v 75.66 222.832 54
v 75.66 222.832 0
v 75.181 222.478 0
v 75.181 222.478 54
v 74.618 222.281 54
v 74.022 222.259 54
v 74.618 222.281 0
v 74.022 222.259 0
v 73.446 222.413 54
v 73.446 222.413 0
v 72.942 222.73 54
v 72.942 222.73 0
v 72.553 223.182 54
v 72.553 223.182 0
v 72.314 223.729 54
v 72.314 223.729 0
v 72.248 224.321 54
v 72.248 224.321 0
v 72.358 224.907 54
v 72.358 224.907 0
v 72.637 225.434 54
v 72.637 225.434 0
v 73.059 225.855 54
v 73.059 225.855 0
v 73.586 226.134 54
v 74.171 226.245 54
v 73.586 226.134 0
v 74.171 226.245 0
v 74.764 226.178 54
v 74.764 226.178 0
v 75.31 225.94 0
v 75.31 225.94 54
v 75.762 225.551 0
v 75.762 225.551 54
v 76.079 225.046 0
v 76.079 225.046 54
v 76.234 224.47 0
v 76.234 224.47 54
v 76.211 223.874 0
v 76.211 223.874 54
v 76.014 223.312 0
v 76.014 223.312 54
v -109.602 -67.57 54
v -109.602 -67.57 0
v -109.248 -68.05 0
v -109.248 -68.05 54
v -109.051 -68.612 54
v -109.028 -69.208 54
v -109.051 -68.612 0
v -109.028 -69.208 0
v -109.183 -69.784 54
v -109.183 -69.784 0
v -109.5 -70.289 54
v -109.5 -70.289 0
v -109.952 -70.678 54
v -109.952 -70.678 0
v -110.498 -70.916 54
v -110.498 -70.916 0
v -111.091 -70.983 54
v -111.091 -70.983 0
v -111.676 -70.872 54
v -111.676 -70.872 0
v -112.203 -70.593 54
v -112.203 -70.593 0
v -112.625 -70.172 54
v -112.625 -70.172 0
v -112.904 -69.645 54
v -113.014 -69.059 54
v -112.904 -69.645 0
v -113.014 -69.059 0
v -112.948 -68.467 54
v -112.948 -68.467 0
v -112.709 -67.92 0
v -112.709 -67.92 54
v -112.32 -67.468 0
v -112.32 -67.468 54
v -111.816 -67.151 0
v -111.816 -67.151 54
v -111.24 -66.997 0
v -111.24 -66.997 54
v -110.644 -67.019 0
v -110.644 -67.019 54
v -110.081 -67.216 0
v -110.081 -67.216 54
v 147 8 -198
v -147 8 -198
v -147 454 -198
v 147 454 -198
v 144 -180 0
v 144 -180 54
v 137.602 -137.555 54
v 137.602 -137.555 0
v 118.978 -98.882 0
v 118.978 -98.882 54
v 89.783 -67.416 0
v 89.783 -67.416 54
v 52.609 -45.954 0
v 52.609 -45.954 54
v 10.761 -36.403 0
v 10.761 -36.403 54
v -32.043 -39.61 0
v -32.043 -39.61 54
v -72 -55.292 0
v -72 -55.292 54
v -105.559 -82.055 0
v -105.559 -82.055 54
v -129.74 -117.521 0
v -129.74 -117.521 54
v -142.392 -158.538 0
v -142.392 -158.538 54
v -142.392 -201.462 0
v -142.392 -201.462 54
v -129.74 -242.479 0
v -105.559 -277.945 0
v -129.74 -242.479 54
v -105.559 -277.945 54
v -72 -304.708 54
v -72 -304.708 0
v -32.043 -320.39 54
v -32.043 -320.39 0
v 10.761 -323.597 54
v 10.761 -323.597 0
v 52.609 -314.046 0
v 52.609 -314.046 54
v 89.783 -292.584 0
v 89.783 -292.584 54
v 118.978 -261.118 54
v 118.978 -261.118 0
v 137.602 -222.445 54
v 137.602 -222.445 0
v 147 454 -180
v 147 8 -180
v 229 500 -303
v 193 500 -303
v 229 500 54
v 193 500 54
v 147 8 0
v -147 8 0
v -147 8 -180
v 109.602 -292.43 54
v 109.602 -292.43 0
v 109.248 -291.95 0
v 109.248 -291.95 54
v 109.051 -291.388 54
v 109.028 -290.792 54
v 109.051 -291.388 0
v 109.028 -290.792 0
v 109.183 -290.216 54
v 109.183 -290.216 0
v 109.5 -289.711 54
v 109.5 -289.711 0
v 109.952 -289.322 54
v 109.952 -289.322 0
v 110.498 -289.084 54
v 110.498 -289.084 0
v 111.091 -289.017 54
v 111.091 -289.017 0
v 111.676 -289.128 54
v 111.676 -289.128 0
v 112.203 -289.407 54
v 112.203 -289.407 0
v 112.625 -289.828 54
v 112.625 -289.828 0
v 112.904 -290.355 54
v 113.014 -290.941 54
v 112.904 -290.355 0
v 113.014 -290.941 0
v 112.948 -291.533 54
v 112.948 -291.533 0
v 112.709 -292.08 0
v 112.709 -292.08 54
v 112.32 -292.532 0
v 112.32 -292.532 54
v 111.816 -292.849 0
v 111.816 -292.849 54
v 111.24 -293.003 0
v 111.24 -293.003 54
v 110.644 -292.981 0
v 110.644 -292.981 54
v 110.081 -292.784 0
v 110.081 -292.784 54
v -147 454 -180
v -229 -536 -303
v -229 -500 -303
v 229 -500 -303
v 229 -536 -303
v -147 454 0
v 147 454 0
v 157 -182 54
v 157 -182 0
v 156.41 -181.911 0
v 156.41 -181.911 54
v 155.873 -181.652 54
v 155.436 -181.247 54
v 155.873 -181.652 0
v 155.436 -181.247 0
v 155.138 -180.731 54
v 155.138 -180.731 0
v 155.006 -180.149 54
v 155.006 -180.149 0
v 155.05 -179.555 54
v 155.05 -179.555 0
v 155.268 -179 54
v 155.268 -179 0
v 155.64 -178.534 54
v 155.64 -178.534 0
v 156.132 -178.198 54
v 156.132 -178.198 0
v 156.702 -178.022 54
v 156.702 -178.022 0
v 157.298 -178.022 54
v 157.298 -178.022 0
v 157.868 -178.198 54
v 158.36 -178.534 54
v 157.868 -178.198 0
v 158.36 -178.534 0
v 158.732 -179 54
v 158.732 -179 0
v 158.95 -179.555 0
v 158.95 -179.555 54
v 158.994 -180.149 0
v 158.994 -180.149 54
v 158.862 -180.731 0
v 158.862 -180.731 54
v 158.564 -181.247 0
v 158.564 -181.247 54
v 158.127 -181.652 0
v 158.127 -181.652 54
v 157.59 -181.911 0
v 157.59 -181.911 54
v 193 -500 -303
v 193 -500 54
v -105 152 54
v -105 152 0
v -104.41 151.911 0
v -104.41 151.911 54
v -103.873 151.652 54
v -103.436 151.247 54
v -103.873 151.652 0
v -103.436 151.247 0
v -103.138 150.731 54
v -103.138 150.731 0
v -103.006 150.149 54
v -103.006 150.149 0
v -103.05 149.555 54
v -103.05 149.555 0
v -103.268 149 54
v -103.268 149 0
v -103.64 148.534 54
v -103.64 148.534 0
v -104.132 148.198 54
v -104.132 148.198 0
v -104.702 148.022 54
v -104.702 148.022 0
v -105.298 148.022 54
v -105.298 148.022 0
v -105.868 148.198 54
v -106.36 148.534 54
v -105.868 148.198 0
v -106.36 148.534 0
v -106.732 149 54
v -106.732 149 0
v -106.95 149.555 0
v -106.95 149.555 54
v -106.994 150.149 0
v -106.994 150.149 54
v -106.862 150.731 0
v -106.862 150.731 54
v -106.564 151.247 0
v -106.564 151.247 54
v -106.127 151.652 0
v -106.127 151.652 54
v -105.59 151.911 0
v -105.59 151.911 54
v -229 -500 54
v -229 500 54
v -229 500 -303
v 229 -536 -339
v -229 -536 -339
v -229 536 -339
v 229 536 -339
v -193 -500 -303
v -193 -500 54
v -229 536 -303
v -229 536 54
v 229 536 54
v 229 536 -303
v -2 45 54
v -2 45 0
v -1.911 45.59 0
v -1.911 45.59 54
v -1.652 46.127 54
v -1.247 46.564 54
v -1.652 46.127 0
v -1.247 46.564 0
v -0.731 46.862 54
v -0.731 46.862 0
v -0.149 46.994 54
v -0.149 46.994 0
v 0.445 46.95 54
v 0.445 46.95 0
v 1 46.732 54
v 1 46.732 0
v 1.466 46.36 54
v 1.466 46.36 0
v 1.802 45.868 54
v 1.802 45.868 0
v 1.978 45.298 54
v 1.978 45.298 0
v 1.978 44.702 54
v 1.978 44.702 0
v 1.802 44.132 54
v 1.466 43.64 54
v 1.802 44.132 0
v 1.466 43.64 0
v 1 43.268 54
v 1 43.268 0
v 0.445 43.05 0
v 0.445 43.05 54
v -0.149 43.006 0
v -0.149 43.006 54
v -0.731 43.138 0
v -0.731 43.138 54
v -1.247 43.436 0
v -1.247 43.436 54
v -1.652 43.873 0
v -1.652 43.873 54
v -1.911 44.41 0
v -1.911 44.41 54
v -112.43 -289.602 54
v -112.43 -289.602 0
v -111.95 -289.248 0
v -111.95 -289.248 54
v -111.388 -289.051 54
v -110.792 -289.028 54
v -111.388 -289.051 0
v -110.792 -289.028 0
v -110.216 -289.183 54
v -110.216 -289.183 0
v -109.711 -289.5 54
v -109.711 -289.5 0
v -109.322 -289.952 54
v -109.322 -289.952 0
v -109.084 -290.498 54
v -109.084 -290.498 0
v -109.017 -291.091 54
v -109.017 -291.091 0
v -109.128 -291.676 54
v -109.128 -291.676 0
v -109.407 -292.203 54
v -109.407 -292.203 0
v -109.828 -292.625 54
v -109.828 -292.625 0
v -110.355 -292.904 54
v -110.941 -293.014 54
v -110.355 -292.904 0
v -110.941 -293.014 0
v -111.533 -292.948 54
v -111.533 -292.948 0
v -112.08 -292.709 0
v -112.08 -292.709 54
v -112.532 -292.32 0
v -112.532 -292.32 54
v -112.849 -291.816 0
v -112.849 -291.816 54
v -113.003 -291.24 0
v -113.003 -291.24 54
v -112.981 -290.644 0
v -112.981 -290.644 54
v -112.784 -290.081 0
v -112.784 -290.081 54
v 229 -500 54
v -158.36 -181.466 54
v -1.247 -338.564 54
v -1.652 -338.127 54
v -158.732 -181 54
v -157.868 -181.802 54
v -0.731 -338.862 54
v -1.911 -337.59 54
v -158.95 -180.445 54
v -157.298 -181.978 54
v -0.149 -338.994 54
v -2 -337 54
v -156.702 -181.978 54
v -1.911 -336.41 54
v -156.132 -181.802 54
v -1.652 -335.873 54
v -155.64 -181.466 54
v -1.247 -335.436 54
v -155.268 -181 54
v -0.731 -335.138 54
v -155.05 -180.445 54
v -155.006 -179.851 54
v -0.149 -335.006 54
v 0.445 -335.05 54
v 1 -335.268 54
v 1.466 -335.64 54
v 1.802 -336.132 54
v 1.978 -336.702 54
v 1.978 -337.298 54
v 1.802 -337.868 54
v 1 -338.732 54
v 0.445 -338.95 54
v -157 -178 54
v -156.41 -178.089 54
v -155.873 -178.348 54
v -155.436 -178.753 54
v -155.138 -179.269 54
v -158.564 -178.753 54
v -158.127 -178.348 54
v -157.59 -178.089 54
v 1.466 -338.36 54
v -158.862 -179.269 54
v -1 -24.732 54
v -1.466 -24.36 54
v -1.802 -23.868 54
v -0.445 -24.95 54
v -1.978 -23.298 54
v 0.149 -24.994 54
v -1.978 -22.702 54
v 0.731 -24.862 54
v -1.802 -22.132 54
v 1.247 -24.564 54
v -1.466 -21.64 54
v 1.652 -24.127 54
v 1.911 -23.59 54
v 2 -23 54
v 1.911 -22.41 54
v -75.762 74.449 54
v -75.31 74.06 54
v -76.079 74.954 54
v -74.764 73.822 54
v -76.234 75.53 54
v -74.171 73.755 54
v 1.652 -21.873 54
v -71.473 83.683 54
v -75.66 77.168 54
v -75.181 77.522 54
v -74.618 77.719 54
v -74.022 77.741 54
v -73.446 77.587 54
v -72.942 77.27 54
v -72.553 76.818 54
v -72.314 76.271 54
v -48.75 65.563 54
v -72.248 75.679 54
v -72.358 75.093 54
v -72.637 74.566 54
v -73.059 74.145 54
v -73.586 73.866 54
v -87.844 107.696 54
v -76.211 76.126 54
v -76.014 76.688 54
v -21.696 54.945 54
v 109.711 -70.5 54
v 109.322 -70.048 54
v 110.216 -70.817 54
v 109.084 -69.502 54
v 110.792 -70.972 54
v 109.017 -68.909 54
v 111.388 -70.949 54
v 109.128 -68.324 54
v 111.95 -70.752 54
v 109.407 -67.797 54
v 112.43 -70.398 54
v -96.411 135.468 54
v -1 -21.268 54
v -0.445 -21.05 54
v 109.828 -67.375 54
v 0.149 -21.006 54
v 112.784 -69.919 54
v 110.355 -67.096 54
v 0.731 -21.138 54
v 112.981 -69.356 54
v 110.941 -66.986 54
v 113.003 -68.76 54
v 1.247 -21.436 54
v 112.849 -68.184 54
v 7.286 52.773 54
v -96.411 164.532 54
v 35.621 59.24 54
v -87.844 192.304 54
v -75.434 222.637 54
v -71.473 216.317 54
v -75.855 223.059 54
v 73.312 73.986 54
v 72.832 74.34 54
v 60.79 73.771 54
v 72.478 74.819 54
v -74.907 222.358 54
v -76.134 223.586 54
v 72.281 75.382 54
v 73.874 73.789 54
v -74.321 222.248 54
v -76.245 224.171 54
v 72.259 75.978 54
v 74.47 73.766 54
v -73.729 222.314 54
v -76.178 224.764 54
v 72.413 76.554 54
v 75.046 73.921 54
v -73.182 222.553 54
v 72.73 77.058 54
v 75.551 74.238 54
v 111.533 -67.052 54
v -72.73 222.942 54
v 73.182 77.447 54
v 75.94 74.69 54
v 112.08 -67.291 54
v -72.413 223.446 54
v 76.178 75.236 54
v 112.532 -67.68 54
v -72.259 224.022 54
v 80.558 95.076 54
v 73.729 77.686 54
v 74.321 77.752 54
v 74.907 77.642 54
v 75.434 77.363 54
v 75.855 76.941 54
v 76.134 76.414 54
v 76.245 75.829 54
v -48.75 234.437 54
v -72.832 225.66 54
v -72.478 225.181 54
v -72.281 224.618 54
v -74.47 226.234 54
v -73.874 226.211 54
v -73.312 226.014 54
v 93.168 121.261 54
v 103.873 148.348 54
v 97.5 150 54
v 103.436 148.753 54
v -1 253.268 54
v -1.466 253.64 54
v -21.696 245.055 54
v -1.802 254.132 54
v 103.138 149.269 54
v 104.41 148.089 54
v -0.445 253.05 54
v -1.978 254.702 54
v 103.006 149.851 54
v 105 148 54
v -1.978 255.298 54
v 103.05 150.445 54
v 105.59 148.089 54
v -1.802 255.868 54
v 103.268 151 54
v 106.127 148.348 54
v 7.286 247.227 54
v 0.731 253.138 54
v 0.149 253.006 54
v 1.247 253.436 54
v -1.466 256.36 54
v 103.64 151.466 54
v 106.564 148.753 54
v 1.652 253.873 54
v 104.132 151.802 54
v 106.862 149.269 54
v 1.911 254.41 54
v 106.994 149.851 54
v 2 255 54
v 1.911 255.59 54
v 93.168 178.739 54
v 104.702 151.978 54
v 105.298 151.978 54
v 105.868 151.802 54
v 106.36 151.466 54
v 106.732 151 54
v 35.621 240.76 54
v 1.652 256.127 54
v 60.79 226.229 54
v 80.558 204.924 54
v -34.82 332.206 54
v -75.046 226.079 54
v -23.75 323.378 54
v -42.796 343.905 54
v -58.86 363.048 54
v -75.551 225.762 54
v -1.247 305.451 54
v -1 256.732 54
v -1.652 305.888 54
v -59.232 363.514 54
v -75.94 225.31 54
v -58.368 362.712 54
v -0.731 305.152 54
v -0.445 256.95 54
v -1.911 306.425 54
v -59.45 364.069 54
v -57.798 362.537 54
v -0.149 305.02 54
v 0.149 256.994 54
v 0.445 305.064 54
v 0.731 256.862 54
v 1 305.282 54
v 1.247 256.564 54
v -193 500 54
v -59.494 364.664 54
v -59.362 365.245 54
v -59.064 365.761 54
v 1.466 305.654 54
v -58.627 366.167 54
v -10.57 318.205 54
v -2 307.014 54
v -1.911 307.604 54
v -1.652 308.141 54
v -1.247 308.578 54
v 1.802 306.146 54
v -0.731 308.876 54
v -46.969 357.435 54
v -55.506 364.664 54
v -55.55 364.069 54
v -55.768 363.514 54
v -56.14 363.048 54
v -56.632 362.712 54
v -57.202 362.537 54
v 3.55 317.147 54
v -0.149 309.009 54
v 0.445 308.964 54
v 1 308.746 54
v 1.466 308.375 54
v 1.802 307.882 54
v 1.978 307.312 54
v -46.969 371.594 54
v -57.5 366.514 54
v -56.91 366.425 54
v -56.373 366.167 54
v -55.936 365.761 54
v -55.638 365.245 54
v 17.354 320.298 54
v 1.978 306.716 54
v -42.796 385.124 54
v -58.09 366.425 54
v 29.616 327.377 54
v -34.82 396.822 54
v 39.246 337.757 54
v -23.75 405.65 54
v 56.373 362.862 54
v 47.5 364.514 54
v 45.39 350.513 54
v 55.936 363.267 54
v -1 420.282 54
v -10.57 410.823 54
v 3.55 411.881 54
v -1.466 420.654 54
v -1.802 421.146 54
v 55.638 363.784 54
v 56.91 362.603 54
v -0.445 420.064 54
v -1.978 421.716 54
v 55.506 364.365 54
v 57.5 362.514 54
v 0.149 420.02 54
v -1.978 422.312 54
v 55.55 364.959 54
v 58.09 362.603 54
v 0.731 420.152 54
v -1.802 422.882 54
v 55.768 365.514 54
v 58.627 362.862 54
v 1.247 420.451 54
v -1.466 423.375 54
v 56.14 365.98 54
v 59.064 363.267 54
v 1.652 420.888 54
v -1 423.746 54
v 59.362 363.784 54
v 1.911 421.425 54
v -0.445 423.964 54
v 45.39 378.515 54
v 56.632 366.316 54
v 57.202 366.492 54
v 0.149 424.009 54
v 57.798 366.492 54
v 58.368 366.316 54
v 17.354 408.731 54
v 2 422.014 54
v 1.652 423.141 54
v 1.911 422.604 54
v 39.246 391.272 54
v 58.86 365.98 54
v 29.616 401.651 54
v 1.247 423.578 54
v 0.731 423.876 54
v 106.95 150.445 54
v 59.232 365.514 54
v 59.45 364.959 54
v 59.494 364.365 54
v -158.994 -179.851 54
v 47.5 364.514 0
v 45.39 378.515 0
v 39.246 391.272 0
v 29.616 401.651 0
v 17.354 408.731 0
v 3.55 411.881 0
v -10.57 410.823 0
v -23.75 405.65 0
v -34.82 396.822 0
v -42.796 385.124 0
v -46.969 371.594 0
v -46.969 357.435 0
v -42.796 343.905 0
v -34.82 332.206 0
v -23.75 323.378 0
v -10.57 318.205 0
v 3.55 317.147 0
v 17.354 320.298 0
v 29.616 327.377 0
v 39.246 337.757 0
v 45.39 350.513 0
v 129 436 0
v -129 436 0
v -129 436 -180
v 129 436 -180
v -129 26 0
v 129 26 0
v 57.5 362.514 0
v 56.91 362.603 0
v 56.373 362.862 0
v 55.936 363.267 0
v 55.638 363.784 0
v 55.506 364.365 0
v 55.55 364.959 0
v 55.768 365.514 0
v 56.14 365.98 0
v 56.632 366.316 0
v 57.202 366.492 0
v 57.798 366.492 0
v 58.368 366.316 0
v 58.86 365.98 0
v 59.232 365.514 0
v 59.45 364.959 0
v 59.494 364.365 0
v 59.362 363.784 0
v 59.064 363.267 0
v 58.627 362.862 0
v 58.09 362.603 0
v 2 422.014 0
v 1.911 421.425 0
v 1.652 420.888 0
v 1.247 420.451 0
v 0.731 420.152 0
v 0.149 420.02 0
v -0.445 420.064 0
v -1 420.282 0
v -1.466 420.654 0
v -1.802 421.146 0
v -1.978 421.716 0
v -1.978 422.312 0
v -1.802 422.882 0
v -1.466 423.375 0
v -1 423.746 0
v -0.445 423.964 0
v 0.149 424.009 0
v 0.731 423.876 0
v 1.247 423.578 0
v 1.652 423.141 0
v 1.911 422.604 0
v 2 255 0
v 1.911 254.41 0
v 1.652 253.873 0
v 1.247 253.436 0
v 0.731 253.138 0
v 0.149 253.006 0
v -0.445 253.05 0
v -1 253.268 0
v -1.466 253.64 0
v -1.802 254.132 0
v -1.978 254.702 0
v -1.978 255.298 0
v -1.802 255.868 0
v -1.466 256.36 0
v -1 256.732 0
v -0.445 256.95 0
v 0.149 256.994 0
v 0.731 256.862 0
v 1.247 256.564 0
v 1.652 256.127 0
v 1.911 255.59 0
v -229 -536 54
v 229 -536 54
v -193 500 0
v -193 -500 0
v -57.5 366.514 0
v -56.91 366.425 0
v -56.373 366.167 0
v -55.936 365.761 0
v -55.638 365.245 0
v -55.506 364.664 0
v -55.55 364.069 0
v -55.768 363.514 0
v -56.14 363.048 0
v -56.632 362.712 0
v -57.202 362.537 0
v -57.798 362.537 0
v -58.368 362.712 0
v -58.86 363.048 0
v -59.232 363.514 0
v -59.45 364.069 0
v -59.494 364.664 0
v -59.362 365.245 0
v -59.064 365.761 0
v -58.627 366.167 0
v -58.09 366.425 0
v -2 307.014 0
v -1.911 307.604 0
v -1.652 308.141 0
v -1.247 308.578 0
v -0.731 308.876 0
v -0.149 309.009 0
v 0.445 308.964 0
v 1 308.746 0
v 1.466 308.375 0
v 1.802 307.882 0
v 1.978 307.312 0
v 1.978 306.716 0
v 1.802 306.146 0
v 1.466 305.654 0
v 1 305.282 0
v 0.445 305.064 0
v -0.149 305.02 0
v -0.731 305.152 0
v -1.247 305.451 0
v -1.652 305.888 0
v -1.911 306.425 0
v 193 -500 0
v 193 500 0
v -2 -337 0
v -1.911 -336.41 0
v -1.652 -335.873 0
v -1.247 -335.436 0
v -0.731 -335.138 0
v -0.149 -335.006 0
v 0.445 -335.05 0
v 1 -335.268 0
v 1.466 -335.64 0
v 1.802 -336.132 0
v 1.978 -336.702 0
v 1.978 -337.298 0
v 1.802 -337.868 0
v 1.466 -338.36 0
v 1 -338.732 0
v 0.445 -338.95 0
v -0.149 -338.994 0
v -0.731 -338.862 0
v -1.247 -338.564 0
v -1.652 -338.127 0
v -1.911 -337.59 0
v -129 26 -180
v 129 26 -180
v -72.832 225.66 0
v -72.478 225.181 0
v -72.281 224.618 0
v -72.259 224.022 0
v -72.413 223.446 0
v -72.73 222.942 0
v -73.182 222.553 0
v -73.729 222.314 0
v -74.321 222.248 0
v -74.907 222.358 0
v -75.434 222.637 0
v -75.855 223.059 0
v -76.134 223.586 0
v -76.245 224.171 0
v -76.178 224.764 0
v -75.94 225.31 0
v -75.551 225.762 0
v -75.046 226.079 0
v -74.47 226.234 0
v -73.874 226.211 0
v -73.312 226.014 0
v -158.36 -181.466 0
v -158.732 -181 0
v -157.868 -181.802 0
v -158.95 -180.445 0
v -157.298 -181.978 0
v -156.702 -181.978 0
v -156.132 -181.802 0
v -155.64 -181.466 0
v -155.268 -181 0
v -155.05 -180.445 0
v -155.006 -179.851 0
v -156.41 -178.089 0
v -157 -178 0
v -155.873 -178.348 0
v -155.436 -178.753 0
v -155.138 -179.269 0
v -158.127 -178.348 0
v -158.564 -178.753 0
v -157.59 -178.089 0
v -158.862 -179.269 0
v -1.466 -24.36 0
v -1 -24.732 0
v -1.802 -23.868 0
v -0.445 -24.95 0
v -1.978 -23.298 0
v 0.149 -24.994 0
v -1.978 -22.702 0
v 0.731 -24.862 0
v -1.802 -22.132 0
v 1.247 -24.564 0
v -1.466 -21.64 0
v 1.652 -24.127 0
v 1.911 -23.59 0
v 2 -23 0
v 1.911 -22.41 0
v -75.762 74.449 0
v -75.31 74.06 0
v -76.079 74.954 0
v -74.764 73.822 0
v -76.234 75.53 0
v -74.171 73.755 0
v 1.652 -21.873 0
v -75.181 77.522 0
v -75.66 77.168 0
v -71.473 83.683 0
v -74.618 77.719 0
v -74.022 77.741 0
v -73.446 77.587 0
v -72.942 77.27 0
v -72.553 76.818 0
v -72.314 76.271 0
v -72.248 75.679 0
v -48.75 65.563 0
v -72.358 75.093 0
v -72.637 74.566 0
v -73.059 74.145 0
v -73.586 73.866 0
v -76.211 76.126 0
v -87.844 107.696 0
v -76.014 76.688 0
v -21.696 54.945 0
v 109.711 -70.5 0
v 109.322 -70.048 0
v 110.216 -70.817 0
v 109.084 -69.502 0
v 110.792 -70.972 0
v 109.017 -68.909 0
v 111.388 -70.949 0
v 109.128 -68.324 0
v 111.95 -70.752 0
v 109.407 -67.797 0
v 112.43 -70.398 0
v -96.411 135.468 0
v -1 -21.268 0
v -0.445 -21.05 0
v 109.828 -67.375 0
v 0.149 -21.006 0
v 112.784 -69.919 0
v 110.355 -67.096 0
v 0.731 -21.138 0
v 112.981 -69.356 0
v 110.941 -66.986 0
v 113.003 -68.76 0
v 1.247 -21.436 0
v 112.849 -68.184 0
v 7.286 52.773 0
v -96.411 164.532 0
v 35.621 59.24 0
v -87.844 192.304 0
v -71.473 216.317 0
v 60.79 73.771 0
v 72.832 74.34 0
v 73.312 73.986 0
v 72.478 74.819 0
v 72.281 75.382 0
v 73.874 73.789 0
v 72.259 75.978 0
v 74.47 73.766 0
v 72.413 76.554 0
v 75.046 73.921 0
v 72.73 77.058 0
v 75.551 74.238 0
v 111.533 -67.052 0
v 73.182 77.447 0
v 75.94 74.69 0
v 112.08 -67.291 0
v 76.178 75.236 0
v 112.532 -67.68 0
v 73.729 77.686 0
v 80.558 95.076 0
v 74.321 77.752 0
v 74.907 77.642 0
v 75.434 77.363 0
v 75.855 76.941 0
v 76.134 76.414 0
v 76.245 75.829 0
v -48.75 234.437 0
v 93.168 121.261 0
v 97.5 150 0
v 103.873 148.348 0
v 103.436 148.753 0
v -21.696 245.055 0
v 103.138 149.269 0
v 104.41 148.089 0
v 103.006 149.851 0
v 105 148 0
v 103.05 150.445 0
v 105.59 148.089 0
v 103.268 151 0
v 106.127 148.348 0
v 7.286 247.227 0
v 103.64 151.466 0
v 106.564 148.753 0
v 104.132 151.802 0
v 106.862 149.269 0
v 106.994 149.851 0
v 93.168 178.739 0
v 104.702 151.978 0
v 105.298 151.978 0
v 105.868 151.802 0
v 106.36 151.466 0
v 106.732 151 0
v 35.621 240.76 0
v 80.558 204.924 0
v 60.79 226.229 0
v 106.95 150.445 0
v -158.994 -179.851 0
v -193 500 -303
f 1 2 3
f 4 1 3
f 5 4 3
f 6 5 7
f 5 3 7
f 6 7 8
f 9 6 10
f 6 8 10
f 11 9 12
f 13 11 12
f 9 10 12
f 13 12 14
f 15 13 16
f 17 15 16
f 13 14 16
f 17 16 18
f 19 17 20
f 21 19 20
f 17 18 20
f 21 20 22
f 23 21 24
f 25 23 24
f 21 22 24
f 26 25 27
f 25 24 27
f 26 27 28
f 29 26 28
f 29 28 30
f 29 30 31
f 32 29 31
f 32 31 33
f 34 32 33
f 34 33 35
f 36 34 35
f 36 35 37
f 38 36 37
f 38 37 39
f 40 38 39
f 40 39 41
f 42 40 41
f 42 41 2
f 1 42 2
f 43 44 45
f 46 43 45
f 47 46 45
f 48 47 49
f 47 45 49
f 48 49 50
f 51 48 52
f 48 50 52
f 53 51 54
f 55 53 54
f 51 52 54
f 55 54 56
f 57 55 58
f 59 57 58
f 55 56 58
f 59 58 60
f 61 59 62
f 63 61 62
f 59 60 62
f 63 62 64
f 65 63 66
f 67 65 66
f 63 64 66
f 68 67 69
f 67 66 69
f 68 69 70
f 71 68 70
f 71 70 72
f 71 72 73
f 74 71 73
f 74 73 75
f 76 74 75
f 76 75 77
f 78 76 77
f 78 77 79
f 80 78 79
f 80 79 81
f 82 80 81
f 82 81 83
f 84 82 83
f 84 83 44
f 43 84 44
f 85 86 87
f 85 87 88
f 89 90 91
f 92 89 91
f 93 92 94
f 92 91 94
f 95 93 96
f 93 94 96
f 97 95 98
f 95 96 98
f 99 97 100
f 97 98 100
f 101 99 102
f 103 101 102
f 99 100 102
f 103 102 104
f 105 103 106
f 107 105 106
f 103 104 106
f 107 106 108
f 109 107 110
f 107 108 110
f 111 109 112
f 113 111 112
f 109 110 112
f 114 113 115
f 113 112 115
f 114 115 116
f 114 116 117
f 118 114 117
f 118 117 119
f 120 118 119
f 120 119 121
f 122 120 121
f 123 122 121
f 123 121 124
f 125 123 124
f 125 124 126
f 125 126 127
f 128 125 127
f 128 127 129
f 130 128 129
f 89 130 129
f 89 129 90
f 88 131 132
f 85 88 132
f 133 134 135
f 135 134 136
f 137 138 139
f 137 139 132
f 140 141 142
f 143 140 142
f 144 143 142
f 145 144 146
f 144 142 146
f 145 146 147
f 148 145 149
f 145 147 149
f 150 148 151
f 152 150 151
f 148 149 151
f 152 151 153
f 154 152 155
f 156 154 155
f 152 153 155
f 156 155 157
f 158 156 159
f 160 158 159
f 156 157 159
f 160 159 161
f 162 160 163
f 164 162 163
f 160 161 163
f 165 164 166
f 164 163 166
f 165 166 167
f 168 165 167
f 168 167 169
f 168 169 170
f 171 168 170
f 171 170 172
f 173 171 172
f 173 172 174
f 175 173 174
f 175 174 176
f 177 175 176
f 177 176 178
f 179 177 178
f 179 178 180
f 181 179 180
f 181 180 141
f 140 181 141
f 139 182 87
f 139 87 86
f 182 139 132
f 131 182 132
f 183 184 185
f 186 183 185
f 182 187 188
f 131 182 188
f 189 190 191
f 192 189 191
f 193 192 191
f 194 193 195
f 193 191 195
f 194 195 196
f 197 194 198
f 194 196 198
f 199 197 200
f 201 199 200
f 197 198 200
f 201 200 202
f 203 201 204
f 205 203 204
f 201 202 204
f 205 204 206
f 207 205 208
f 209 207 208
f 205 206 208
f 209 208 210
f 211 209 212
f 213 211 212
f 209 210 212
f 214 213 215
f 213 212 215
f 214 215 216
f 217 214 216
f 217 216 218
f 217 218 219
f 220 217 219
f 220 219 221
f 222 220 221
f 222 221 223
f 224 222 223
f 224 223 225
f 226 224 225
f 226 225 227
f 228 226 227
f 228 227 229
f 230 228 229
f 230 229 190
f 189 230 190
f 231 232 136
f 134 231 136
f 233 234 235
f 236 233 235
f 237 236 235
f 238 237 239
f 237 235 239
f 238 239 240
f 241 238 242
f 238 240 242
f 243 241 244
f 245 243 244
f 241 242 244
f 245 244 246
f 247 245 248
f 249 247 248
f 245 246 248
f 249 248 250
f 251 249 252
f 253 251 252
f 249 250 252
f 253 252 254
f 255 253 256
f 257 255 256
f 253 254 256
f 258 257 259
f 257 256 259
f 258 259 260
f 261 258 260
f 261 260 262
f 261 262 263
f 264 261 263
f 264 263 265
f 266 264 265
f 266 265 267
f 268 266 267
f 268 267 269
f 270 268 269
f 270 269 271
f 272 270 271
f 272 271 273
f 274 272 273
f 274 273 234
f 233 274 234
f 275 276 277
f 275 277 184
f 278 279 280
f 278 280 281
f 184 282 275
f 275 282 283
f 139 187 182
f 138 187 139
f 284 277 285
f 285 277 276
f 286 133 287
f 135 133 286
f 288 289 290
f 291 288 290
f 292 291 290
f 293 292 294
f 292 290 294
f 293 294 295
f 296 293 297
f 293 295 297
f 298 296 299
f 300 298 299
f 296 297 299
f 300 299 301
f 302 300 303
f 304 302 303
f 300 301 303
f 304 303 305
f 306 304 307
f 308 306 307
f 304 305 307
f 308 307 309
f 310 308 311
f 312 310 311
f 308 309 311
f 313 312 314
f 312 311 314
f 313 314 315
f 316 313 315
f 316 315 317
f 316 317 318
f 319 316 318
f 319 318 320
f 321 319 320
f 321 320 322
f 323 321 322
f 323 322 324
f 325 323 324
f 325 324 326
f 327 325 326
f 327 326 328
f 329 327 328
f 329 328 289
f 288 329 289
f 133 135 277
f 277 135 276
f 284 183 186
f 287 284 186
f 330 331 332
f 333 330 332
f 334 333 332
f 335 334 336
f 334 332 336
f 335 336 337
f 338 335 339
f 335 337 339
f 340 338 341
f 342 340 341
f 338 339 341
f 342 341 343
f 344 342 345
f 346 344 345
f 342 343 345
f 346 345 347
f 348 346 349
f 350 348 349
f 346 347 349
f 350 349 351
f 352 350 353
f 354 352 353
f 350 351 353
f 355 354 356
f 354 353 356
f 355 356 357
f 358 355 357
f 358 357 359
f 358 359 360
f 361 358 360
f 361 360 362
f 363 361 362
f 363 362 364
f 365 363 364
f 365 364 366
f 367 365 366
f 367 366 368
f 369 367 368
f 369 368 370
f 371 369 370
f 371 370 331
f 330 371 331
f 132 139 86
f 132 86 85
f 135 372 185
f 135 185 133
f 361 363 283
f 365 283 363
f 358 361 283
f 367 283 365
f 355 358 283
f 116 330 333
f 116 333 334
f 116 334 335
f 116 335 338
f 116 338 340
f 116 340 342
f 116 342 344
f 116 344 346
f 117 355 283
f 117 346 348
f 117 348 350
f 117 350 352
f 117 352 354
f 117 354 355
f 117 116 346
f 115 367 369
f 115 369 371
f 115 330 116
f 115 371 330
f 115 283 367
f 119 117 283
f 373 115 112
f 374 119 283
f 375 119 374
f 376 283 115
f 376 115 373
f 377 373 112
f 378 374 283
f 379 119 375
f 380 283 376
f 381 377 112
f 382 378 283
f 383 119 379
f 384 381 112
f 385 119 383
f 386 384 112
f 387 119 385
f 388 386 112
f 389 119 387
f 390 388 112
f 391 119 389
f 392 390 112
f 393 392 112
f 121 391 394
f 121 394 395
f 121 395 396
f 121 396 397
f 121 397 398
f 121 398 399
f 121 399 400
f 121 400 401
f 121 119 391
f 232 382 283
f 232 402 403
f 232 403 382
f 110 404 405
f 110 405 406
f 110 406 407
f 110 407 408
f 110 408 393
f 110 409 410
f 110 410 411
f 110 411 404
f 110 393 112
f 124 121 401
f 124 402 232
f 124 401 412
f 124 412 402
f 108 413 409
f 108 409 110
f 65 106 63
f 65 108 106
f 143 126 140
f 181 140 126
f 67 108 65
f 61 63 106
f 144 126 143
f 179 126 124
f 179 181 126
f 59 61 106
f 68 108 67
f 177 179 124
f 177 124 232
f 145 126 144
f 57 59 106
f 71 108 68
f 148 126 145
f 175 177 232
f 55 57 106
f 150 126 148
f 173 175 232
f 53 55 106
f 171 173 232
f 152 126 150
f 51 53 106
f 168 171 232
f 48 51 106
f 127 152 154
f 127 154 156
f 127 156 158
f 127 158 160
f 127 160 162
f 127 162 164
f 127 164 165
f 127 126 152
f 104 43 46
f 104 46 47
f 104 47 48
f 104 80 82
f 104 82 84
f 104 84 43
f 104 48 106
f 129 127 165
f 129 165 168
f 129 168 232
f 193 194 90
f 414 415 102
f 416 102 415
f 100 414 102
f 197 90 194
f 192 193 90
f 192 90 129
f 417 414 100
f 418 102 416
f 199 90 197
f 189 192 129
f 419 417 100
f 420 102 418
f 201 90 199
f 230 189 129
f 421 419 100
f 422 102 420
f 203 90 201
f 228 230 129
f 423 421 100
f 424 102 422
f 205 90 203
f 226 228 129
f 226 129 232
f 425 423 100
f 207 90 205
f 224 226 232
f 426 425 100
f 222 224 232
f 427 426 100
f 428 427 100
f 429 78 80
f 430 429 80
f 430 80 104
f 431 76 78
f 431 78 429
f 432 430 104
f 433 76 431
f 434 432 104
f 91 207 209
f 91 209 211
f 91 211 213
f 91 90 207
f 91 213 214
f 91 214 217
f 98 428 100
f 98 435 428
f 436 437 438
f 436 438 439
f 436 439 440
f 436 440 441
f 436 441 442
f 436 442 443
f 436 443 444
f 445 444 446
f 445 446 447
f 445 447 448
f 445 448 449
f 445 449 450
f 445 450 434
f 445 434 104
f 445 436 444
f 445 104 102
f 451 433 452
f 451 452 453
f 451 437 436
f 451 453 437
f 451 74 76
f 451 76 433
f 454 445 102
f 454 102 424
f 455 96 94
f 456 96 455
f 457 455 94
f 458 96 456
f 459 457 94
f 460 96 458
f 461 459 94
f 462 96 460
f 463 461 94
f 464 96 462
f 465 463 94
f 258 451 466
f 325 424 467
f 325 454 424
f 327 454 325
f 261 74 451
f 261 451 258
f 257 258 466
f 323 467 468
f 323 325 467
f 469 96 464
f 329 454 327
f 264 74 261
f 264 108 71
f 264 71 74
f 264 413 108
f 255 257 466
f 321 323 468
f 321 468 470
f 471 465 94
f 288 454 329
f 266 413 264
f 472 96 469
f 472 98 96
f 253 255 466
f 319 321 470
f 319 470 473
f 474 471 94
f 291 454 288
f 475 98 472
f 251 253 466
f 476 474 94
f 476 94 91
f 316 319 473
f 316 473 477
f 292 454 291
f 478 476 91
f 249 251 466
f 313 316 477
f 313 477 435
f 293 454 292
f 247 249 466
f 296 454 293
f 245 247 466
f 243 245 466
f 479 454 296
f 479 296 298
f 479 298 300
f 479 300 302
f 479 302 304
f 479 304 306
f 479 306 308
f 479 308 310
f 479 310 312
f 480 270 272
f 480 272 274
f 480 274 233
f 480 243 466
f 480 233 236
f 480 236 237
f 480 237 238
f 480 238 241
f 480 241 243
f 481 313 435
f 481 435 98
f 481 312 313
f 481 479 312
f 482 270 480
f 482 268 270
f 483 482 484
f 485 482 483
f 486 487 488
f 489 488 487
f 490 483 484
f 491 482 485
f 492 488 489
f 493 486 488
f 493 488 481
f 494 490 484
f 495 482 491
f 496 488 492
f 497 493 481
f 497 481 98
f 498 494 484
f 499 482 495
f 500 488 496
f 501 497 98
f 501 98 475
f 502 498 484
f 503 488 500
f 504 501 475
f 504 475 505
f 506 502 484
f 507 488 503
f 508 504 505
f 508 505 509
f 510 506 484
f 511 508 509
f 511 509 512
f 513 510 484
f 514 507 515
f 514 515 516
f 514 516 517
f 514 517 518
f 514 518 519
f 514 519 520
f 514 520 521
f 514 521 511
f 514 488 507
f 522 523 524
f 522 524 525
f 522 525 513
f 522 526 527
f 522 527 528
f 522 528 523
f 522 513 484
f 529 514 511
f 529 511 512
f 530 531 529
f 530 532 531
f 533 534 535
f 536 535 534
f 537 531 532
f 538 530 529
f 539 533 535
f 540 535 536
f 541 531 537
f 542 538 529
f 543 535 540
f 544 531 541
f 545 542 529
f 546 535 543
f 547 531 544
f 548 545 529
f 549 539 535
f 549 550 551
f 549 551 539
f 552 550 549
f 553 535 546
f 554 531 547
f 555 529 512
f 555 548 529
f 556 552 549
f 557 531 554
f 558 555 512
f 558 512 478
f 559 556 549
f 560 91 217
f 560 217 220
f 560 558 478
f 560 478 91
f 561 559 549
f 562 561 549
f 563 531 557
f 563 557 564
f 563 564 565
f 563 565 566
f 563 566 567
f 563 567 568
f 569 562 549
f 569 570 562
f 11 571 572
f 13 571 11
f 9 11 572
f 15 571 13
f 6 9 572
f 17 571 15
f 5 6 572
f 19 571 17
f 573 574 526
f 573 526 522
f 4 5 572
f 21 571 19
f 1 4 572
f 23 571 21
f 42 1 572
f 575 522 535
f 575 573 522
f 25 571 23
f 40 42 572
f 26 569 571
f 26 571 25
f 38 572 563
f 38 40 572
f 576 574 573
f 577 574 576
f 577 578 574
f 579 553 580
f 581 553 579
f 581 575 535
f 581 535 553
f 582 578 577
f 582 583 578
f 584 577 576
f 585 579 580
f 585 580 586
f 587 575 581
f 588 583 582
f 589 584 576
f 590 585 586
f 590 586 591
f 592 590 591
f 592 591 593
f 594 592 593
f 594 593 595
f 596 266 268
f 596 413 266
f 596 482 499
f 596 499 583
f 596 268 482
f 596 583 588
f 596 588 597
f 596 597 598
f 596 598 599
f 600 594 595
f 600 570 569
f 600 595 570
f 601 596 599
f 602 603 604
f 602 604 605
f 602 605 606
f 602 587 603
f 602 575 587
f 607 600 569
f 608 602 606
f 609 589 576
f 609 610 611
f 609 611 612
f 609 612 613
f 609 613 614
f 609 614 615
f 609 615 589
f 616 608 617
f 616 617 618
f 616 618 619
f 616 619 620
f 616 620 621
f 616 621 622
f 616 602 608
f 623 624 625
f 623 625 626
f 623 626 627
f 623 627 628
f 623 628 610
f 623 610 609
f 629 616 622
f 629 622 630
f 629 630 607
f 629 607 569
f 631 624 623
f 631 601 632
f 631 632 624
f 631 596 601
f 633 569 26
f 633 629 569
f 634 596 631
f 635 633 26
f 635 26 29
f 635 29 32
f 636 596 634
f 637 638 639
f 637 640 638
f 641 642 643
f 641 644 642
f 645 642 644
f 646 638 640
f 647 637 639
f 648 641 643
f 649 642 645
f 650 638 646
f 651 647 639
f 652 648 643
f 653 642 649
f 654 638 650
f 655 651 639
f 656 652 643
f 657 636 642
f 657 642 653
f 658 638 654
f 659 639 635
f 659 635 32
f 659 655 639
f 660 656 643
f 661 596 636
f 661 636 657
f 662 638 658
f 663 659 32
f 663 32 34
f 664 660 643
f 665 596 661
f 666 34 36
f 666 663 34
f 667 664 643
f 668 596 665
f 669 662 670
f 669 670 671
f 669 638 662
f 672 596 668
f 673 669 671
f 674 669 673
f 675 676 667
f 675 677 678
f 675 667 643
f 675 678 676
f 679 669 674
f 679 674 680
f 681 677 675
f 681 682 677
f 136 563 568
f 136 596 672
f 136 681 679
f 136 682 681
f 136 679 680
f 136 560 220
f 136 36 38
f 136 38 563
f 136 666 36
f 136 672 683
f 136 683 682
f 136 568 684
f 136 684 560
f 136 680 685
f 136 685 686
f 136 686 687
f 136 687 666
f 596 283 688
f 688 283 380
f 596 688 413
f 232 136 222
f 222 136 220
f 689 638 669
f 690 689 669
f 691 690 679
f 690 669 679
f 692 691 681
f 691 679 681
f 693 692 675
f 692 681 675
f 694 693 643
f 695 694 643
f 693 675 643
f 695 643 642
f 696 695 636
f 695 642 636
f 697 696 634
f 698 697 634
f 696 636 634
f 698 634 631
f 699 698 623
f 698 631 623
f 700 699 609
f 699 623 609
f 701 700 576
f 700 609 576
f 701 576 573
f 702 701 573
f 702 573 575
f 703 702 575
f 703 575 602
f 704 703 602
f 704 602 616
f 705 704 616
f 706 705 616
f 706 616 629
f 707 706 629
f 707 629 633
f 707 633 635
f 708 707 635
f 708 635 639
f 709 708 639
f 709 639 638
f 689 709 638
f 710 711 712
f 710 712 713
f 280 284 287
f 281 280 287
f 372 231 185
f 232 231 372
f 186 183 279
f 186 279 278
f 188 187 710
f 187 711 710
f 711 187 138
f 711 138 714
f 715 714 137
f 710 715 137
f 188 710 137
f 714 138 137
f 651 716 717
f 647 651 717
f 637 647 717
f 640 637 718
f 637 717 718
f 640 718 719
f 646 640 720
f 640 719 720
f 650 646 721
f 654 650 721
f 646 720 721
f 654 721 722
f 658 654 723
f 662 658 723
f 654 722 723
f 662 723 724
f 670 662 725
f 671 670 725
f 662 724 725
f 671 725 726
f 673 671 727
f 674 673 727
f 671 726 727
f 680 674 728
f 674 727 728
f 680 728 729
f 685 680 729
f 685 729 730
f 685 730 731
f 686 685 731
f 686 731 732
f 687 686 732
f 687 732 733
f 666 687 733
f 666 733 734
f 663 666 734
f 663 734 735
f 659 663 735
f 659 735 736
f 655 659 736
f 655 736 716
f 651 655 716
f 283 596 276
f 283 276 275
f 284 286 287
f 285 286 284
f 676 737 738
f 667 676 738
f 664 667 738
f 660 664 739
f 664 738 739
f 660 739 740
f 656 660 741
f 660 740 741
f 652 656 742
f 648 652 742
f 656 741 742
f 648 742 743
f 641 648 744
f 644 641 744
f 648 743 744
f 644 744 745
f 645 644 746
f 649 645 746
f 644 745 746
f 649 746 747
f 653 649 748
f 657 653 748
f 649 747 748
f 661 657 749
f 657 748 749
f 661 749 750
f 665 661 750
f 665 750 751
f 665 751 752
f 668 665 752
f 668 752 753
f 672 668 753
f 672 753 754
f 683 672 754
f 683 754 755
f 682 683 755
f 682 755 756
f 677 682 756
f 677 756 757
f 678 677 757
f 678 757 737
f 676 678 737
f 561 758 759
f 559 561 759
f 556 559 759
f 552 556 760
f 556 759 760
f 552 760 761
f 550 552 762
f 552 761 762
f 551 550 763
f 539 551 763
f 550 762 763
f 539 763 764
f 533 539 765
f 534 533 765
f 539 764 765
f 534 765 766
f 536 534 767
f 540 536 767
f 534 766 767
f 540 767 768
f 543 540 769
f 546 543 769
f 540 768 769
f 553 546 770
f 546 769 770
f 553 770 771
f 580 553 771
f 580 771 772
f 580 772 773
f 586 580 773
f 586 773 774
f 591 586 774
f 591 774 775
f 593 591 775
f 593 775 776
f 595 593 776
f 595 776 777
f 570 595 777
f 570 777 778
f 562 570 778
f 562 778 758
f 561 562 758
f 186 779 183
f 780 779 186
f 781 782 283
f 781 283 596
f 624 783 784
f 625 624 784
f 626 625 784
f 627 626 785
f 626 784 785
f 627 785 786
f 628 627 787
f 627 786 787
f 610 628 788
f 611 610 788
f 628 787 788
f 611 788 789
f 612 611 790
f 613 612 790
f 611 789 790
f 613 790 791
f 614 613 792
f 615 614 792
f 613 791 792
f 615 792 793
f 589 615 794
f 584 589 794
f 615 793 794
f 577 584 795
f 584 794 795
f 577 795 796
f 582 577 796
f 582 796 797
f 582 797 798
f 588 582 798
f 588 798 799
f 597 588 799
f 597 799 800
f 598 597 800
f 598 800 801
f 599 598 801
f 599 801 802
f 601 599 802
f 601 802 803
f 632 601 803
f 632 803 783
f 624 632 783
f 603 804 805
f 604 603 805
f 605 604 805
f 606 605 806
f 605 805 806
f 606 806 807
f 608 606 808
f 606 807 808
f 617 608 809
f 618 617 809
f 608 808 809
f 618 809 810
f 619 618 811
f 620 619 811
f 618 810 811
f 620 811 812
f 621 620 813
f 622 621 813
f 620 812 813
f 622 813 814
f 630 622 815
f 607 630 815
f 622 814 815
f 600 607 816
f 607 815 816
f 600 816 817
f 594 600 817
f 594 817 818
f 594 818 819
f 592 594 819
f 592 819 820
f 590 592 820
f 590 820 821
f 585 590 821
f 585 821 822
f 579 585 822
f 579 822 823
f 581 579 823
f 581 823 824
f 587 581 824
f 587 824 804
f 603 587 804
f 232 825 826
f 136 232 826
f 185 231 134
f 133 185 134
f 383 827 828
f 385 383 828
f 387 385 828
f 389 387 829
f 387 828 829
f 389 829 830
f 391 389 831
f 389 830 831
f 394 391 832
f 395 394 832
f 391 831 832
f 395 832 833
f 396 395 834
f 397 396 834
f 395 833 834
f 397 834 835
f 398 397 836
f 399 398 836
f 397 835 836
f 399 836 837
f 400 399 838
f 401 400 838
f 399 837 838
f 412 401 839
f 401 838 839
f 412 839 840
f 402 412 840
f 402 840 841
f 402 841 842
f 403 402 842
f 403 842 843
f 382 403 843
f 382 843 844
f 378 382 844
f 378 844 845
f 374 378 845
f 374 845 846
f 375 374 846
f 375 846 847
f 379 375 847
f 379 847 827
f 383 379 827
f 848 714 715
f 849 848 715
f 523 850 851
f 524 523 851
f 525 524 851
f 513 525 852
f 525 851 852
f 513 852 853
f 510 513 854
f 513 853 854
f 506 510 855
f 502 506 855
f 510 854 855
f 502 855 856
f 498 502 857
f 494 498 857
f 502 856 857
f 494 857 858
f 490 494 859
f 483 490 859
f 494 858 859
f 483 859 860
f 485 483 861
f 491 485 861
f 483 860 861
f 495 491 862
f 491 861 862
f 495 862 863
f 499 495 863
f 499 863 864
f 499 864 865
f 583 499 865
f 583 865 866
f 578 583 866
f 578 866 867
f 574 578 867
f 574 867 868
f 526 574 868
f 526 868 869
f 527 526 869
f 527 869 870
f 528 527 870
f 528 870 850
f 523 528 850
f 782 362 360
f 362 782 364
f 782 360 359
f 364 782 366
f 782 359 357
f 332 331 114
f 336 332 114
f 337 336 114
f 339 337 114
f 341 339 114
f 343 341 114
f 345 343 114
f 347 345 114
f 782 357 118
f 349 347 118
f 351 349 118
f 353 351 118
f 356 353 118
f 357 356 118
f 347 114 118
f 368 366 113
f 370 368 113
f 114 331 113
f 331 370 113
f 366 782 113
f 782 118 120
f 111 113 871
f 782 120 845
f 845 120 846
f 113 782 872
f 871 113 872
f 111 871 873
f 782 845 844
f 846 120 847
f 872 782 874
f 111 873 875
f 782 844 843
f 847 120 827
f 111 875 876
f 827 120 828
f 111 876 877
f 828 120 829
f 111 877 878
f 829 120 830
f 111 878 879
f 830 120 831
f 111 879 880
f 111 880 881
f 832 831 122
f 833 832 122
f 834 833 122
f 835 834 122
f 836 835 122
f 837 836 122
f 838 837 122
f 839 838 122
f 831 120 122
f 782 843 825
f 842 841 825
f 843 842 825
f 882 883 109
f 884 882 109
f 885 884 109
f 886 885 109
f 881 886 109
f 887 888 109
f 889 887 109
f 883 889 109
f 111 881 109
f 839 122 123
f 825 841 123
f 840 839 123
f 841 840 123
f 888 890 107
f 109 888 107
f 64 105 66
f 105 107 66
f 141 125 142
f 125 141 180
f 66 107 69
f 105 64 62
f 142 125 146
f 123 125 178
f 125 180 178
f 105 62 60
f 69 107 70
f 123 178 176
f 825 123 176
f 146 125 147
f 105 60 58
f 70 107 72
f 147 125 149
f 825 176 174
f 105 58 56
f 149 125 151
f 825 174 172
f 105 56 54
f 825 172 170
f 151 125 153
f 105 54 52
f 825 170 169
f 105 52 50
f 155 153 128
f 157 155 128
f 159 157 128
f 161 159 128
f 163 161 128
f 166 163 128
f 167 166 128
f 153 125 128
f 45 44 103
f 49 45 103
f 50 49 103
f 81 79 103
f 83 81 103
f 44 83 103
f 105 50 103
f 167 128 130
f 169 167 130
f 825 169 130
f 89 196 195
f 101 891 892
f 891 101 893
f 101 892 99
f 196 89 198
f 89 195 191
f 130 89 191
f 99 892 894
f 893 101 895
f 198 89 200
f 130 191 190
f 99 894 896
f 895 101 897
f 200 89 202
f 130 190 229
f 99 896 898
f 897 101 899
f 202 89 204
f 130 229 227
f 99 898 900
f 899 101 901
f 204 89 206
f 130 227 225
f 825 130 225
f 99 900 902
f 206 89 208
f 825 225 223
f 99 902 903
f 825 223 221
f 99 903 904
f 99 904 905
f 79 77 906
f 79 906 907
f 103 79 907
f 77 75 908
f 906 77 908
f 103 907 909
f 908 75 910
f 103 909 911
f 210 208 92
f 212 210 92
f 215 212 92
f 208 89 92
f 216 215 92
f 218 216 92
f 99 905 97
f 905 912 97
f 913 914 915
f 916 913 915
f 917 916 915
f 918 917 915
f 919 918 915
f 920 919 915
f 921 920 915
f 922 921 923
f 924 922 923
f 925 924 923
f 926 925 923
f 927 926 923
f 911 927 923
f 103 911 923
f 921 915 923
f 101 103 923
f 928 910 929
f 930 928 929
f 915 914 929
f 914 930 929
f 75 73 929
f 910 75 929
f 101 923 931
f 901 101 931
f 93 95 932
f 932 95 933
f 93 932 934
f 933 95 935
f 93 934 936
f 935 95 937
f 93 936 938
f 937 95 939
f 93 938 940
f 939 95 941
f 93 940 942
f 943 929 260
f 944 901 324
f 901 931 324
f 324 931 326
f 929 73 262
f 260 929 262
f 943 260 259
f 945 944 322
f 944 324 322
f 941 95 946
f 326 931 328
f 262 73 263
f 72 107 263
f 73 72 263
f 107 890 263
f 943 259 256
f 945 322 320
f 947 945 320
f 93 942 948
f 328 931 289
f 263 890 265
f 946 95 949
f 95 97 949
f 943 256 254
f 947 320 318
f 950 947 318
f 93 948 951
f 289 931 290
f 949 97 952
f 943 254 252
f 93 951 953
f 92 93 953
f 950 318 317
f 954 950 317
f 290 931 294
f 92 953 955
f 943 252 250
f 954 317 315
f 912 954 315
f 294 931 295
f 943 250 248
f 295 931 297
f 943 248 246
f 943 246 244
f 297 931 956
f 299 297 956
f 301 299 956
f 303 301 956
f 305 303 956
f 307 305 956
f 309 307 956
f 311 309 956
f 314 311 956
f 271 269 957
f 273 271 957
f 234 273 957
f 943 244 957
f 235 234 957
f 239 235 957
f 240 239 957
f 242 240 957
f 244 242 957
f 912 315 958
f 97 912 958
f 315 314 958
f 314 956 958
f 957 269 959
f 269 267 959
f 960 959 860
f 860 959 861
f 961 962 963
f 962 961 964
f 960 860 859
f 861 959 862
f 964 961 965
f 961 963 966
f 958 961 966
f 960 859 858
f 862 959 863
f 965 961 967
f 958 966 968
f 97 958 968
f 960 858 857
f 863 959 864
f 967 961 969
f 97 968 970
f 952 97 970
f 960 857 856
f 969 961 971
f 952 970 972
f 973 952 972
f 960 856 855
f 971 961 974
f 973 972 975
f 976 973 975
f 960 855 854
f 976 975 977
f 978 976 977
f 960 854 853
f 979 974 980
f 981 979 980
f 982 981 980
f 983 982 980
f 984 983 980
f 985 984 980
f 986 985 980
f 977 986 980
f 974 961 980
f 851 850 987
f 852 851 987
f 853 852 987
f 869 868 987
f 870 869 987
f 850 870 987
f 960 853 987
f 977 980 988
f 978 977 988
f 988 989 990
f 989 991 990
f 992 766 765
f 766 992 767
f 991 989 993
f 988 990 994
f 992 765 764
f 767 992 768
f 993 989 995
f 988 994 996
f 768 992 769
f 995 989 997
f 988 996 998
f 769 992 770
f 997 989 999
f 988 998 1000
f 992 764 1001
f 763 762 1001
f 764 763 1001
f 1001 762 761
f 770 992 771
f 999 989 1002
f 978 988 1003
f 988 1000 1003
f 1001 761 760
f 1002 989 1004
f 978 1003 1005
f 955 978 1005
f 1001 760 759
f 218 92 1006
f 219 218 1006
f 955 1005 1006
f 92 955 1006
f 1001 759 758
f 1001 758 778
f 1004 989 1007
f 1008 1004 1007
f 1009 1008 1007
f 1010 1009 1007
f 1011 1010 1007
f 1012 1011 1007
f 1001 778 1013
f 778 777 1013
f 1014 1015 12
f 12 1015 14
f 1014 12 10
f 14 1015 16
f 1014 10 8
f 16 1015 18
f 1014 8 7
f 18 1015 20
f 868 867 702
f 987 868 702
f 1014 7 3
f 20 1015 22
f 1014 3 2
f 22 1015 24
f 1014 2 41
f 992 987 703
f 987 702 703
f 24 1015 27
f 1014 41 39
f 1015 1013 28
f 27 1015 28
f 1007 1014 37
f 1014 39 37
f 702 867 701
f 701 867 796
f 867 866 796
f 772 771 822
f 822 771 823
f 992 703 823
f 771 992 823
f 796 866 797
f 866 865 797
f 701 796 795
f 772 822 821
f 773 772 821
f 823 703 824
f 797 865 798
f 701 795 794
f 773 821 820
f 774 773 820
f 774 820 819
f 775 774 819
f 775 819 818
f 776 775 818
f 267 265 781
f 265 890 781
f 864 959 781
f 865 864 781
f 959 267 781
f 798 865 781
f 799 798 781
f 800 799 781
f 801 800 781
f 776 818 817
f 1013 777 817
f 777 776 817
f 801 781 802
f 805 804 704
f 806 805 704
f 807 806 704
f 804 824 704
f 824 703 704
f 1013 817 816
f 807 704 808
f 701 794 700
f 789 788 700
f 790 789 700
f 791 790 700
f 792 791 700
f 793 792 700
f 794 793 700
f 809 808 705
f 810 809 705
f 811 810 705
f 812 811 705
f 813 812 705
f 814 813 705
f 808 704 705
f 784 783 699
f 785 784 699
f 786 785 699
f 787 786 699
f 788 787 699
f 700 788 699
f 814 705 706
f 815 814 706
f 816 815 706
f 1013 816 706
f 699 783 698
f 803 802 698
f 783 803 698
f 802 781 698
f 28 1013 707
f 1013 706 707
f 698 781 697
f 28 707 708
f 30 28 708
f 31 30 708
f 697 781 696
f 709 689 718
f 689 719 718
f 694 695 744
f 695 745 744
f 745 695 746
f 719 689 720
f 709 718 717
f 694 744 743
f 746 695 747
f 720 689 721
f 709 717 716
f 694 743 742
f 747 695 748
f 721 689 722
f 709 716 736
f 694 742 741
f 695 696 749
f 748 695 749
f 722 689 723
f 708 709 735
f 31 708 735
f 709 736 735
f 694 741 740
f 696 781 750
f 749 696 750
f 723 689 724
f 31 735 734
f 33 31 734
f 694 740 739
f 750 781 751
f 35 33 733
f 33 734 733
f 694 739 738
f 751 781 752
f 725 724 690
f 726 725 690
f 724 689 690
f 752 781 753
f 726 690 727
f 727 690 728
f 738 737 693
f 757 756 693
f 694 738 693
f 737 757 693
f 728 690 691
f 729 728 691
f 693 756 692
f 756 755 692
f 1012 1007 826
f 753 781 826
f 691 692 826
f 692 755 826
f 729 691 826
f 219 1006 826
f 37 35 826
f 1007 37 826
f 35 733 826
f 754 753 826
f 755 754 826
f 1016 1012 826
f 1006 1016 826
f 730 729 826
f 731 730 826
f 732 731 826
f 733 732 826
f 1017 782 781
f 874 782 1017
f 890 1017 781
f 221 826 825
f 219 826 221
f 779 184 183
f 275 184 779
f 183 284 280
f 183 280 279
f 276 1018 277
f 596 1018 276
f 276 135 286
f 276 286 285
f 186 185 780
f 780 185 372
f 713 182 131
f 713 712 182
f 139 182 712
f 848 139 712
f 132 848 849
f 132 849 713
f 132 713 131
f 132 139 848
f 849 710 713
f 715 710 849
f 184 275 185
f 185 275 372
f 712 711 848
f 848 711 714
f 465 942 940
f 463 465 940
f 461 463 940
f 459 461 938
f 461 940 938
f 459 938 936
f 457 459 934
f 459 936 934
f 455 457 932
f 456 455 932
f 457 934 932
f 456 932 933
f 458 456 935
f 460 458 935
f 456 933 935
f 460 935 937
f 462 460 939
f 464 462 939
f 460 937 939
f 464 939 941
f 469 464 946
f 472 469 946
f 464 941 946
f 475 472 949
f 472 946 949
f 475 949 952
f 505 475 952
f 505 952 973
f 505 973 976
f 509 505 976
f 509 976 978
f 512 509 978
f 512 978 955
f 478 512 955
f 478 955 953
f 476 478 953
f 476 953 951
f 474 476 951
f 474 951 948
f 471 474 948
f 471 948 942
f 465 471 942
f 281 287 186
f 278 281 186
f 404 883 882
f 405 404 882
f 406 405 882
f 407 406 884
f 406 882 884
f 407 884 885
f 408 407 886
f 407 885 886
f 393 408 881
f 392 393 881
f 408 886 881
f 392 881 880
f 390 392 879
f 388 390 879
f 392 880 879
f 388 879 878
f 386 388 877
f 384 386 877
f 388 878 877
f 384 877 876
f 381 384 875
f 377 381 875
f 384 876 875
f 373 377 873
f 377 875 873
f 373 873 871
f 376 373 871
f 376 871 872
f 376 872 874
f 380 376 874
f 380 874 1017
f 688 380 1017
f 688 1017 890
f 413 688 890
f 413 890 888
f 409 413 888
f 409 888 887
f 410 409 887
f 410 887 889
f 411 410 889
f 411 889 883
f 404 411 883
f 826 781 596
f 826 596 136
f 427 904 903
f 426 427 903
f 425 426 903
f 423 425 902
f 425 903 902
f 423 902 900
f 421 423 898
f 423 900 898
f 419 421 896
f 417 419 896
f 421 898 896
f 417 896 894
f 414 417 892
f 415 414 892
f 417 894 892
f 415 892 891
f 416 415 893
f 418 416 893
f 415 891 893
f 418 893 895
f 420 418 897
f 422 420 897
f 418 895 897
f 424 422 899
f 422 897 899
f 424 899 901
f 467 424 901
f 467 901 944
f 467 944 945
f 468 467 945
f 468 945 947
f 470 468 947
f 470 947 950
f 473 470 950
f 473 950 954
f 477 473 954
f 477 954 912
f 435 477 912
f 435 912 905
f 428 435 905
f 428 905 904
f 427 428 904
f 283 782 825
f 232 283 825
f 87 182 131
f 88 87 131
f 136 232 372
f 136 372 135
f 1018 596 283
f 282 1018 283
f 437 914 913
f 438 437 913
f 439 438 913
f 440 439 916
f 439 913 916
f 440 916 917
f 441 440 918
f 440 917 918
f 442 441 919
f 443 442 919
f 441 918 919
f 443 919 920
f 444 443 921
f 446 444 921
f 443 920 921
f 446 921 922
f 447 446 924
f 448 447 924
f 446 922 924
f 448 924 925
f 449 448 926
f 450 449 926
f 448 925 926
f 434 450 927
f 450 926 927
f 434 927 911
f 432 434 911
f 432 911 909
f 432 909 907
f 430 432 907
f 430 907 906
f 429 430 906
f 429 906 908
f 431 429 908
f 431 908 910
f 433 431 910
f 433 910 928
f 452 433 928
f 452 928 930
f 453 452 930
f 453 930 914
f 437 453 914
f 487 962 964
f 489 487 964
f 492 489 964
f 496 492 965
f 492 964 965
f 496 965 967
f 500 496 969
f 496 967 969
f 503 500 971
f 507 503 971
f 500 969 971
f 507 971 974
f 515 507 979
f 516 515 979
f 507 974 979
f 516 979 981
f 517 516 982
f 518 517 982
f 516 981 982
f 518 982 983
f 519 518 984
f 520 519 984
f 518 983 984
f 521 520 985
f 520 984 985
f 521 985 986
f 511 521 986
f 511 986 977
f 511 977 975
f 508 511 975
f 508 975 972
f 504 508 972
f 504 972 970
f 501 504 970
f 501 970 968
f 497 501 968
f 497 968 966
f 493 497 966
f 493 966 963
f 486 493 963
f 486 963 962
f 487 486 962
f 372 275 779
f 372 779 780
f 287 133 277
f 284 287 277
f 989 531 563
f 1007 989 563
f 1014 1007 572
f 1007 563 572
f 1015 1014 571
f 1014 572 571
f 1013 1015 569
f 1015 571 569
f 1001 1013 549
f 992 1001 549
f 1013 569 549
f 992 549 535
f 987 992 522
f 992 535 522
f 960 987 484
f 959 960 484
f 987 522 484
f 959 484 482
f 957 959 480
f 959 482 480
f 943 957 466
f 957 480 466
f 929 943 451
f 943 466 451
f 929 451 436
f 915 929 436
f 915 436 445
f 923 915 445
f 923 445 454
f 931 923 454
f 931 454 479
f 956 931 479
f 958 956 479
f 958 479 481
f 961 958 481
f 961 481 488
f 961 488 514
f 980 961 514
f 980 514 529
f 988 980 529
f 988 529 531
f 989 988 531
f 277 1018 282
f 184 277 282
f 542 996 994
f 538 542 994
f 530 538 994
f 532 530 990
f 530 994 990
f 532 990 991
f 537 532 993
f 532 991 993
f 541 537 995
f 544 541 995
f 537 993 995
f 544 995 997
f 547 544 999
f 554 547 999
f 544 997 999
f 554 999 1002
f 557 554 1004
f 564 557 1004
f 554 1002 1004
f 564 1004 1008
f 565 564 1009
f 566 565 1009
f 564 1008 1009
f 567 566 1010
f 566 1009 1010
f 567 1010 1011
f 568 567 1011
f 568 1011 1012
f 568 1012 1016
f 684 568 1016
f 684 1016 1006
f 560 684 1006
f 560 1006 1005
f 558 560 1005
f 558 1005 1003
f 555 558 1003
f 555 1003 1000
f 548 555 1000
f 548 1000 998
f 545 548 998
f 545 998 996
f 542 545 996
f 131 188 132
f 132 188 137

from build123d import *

# Parameters (mm, degrees)
F0_W             = 386
F0_H             = 1000
F1_DEPTH         = 54
F2_R             = 144
F2_R_2           = 97.5
F2_R_3           = 47.5
F3_DEPTH         = 80
F4_W             = 1000
F4_H             = 357
F5_DEPTH         = 36
F6_W             = 1000
F6_H             = 357
F7_DEPTH         = 36
F8_W             = 294
F8_H             = 446
F8_W_2           = 258
F8_H_2           = 410
F9_DEPTH         = 180
F10_W            = 294
F10_H            = 446
F11_DEPTH        = 18
F12_W            = 458
F12_H            = 357
F13_DEPTH        = 36
F14_W            = 458
F14_H            = 357
F15_DEPTH        = 36
F16_W            = 458
F16_H            = 1072
F17_DEPTH        = 36
F19_D            = 4
F19_COPIES_COUNT = 8
F21_D            = 4
F21_COPIES_COUNT = 8
F23_D            = 4
F23_COPIES_COUNT = 4


# Not quite as in the source:
# - a pattern or mirror of a feature is missing from the dataset's text; its kind, count and spacing are read off the source's solid


with BuildPart() as f1:
    # F0 (on Top) → F1 (new body)
    with BuildSketch(Plane.XY):
        Rectangle(F0_W, F0_H)
    extrude(amount=F1_DEPTH)

    # F2 (on face) → F3 (cut)
    with BuildSketch(Plane.XY.offset(54)):
        with Locations((0, -180)):
            Circle(F2_R)
        with Locations((0, 150)):
            Circle(F2_R_2)
        with Locations((0, 364.5142316818)):
            Circle(F2_R_3)
    extrude(amount=-F3_DEPTH, mode=Mode.SUBTRACT)

    # F19 (through all)
    with Locations(Plane.XY.offset(54)):
        with Locations((0, -337)):
            f19 = Hole(F19_D / 2)

    # F19_copies: F19 ×8 about axis
    f19_copies_axis = Axis((0, -180, 0), (0, 0, 1))
    for i in range(1, F19_COPIES_COUNT):
        add(f19.rotate(f19_copies_axis, i * 360 / F19_COPIES_COUNT), mode=Mode.SUBTRACT)

    # F21 (through all)
    with Locations(Plane.XY.offset(54)):
        with Locations((0, 45)):
            f21 = Hole(F21_D / 2)

    # F21_copies: F21 ×8 about axis
    f21_copies_axis = Axis((0, 150, 0), (0, 0, 1))
    for i in range(1, F21_COPIES_COUNT):
        add(f21.rotate(f21_copies_axis, i * 360 / F21_COPIES_COUNT), mode=Mode.SUBTRACT)

    # F23 (through all)
    with Locations(Plane.XY.offset(54)):
        with Locations((0, 307.0142316818)):
            f23 = Hole(F23_D / 2)

    # F23_copies: F23 ×4 about axis
    f23_copies_axis = Axis((0, 364.514232, 0), (0, 0, 1))
    for i in range(1, F23_COPIES_COUNT):
        add(f23.rotate(f23_copies_axis, i * 360 / F23_COPIES_COUNT), mode=Mode.SUBTRACT)


with BuildPart() as f5:
    # F4 (on face) → F5 (new body)
    with BuildSketch(Plane(origin=(-193, 0, 0), x_dir=(0, -1, 0), z_dir=(-1, 0, 0))):
        with Locations((0, -124.5)):
            Rectangle(F4_W, F4_H)
    extrude(amount=F5_DEPTH)


with BuildPart() as f7:
    # F6 (on face) → F7 (new body)
    with BuildSketch(Plane.YZ.offset(193)):
        with Locations((0, -124.5)):
            Rectangle(F6_W, F6_H)
    extrude(amount=F7_DEPTH)


with BuildPart() as f9:
    # F8 (on face) → F9 (new body)
    with BuildSketch(Plane(origin=(0, 0, 0), x_dir=(1, 0, 0), z_dir=(0, 0, -1))):
        with Locations((0, -231)):
            Rectangle(F8_W, F8_H)
        with Locations((0, -231)):
            Rectangle(F8_W_2, F8_H_2, mode=Mode.SUBTRACT)
    extrude(amount=F9_DEPTH)


with BuildPart() as f11:
    # F10 (on face) → F11 (new body)
    with BuildSketch(Plane(origin=(0, 0, -180), x_dir=(1, 0, 0), z_dir=(0, 0, -1))):
        with Locations((0, -231)):
            Rectangle(F10_W, F10_H)
    extrude(amount=F11_DEPTH)


with BuildPart() as f13:
    # F12 (on face) → F13 (new body)
    with BuildSketch(Plane(origin=(0, 500, 0), x_dir=(-1, 0, 0), z_dir=(0, 1, 0))):
        with Locations((0, -124.5)):
            Rectangle(F12_W, F12_H)
    extrude(amount=F13_DEPTH)


with BuildPart() as f15:
    # F14 (on face) → F15 (new body)
    with BuildSketch(Plane.XZ.offset(500)):
        with Locations((0, -124.5)):
            Rectangle(F14_W, F14_H)
    extrude(amount=F15_DEPTH)


with BuildPart() as f17:
    # F16 (on face) → F17 (new body)
    with BuildSketch(Plane(origin=(0, 0, -303), x_dir=(1, 0, 0), z_dir=(0, 0, -1))):
        Rectangle(F16_W, F16_H)
    extrude(amount=F17_DEPTH)


solid = Compound([f1.part, f5.part, f7.part, f9.part, f11.part, f13.part, f15.part, f17.part])
